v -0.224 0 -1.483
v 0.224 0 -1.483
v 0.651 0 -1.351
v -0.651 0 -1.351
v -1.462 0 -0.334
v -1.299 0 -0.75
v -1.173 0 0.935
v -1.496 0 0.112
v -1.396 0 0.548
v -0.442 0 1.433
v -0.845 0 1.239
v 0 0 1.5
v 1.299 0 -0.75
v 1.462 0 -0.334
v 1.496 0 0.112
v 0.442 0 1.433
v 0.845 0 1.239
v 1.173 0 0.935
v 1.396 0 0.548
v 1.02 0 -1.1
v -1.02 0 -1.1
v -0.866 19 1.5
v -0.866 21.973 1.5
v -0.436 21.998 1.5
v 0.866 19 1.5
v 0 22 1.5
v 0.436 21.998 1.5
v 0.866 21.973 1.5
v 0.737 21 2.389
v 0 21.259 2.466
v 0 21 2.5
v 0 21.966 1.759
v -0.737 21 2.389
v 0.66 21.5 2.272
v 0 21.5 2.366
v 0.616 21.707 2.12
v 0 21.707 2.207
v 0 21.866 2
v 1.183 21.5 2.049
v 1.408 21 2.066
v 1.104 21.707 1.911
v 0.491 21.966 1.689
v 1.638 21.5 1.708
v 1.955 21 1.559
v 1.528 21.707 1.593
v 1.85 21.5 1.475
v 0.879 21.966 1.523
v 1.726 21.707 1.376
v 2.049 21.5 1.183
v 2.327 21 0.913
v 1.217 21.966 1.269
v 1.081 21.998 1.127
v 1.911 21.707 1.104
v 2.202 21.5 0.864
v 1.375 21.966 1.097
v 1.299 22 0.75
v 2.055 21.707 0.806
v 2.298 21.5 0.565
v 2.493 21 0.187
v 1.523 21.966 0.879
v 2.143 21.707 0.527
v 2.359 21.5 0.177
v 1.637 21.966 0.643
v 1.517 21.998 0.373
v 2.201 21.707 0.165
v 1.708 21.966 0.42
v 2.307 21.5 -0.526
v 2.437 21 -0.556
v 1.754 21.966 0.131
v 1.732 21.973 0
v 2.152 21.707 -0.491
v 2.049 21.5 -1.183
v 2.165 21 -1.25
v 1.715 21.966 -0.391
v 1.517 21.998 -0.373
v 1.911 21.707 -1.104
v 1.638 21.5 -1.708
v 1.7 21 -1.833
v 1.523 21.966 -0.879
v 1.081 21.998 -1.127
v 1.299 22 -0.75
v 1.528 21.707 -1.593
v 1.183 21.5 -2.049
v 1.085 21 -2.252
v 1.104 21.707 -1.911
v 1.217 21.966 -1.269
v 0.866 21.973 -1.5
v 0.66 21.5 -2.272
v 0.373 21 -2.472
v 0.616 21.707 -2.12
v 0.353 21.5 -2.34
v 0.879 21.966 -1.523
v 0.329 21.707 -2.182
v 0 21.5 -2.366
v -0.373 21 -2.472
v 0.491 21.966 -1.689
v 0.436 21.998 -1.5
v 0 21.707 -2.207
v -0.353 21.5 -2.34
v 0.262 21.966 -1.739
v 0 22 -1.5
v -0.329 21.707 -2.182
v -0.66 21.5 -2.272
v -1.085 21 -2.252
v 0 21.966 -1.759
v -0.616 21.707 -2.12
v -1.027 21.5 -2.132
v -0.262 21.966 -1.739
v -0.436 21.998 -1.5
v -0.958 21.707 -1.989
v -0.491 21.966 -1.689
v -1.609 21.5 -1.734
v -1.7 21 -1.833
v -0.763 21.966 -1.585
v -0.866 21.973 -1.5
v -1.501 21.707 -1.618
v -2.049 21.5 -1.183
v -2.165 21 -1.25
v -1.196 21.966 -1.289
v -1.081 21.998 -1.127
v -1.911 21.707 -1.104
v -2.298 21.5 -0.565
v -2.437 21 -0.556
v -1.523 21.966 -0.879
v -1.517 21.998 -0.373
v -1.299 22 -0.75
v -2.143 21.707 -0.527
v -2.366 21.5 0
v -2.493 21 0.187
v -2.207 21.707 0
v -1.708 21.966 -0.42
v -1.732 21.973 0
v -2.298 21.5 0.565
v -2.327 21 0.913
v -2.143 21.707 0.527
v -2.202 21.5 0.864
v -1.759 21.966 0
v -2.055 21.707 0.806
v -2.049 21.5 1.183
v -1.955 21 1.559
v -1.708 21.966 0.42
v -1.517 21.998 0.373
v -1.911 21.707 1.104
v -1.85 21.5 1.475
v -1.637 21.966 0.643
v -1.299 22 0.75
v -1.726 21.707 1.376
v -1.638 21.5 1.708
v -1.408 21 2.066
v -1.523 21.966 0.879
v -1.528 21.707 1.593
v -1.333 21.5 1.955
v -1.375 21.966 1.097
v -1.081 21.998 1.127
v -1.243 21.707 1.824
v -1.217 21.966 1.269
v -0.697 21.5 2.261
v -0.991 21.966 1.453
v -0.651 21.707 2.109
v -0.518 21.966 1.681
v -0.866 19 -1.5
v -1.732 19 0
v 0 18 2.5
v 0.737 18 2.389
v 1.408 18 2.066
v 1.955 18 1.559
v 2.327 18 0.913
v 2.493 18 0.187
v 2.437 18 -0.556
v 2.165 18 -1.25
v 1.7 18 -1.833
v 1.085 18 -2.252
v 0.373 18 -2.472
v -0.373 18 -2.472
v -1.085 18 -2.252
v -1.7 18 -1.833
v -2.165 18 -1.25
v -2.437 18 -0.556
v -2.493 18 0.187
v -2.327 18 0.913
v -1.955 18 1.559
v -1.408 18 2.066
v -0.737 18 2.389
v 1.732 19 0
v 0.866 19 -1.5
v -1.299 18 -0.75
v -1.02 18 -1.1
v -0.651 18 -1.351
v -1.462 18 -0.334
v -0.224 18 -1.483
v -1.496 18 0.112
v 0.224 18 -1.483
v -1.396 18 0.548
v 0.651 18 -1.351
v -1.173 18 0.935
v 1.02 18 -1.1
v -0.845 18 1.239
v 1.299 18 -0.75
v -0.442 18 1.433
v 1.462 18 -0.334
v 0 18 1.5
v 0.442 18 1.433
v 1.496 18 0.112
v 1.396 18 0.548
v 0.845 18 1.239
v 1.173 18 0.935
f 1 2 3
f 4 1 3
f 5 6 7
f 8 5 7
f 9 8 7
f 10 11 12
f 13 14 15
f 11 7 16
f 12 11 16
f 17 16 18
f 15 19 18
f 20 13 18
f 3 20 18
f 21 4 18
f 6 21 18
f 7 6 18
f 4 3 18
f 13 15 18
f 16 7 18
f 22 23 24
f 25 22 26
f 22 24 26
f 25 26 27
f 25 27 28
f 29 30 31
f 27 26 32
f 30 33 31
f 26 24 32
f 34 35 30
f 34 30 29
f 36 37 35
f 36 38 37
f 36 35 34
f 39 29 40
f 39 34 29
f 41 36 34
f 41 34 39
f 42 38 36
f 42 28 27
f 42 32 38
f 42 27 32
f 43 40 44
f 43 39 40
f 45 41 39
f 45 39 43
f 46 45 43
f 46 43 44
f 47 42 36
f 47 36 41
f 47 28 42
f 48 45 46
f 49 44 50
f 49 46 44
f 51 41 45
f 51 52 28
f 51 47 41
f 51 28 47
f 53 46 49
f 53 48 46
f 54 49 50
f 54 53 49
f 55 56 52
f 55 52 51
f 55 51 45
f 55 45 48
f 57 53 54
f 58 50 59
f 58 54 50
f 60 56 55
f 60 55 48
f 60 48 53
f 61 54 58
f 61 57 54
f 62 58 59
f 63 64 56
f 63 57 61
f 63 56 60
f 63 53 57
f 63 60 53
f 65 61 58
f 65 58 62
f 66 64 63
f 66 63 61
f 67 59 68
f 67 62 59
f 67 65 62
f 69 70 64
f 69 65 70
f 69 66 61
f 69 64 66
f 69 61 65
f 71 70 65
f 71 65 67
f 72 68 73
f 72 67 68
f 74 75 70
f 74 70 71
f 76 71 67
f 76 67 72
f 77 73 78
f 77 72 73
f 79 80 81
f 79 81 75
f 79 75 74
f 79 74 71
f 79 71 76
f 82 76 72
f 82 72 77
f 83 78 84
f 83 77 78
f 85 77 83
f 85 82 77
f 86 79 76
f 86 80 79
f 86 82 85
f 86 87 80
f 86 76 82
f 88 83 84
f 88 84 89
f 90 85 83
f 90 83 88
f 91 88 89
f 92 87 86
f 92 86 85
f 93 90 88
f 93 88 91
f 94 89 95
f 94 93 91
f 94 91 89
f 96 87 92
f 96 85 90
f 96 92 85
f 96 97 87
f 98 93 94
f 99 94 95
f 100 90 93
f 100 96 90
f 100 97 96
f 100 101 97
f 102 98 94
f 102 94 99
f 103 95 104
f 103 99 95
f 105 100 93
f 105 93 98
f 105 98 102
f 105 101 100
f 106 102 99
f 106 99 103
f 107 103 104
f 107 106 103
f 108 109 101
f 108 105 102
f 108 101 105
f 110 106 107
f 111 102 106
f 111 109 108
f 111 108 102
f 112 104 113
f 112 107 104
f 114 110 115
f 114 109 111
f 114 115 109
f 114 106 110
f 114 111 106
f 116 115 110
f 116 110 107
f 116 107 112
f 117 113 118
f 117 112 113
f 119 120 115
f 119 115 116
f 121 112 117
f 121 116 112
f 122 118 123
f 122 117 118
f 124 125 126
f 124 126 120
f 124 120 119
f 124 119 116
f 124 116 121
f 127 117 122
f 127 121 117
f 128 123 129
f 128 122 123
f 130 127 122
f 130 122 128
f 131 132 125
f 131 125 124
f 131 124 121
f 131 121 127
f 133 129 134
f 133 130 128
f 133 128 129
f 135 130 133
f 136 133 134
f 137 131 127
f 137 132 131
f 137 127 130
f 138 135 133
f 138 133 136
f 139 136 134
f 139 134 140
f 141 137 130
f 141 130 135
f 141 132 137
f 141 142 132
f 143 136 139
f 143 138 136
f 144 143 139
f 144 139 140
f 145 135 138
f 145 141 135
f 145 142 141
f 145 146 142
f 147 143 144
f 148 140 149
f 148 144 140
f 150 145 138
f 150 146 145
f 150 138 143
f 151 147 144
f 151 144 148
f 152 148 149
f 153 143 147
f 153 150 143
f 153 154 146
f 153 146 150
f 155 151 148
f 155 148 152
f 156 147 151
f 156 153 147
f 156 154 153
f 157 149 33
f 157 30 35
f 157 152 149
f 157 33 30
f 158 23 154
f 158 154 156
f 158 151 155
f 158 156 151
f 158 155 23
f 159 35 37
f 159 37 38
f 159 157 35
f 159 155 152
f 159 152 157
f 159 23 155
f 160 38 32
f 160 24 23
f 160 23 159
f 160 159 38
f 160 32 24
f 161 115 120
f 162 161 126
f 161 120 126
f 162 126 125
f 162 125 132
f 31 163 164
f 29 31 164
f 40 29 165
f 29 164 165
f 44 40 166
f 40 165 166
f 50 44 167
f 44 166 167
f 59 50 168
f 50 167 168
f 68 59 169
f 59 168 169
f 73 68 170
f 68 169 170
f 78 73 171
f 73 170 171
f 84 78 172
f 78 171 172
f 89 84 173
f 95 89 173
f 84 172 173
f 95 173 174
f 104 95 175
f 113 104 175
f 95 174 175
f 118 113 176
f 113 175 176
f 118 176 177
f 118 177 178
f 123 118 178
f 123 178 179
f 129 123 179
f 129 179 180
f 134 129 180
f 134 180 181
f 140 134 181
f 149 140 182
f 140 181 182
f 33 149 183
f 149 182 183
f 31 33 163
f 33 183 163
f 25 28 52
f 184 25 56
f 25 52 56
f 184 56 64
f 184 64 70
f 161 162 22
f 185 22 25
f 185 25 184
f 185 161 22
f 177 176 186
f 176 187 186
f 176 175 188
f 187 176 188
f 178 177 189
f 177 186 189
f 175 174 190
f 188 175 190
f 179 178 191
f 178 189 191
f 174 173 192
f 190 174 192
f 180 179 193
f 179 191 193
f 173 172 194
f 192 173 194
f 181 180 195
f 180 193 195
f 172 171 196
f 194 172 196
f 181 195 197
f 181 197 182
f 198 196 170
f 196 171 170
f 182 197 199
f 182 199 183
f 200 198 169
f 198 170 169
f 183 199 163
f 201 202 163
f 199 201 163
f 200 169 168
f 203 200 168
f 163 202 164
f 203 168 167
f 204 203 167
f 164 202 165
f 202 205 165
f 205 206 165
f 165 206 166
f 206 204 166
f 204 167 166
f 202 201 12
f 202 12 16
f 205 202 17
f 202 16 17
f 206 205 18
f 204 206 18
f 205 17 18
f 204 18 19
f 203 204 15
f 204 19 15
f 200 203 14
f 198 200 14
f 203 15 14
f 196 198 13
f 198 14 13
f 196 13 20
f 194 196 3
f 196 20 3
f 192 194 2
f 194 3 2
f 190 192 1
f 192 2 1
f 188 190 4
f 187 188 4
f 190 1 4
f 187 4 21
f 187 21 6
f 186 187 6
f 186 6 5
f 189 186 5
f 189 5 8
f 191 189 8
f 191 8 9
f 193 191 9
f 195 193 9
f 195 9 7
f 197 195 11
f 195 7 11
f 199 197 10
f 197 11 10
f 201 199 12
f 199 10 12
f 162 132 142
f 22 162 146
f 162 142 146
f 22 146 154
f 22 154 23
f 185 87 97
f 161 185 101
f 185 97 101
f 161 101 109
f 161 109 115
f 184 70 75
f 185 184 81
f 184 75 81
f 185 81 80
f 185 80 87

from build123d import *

# Parameters (mm, degrees)
SKETCH1_R           = 1.5
BOSS_EXTRUDE1_DEPTH = 18
SKETCH2_R           = 2.5
BOSS_EXTRUDE2_DEPTH = 4
FILLET2_R           = 1
CUT_EXTRUDE2_DEPTH  = 3


with BuildPart() as part:
    # Sketch1 → Boss-Extrude1 (new body)
    with BuildSketch(Plane(origin=(0, 0, 0), x_dir=(1, 0, 0), z_dir=(0, 1, 0))):
        with Locations(Location((0, 0, 0), (0, 0, 270))):
            Circle(SKETCH1_R)
    extrude(amount=BOSS_EXTRUDE1_DEPTH)

    # Sketch2 → Boss-Extrude2 (add)
    with BuildSketch(Plane(origin=(0, 18, 0), x_dir=(1, 0, 0), z_dir=(0, 1, 0))):
        with Locations(Location((0, 0, 0), (0, 0, 270))):
            Circle(SKETCH2_R)
    extrude(amount=BOSS_EXTRUDE2_DEPTH)

    # Fillet2
    fillet2_edges = [part.edges().sort_by_distance(p)[0] for p in [
        (0, 22, -2.5),
    ]]
    fillet(fillet2_edges, radius=FILLET2_R)

    # Sketch3 → Cut-Extrude2 (cut)
    with BuildSketch(Plane(origin=(0, 22, 0), x_dir=(1, 0, 0), z_dir=(0, 1, 0))):
        Polygon((1.732050808, 0), (0.866025404, 1.5), (-0.866025404, 1.5), (-1.732050808, 0), (-0.866025404, -1.5), (0.866025404, -1.5), align=None)
    extrude(amount=-CUT_EXTRUDE2_DEPTH, mode=Mode.SUBTRACT)


solid = part.part
